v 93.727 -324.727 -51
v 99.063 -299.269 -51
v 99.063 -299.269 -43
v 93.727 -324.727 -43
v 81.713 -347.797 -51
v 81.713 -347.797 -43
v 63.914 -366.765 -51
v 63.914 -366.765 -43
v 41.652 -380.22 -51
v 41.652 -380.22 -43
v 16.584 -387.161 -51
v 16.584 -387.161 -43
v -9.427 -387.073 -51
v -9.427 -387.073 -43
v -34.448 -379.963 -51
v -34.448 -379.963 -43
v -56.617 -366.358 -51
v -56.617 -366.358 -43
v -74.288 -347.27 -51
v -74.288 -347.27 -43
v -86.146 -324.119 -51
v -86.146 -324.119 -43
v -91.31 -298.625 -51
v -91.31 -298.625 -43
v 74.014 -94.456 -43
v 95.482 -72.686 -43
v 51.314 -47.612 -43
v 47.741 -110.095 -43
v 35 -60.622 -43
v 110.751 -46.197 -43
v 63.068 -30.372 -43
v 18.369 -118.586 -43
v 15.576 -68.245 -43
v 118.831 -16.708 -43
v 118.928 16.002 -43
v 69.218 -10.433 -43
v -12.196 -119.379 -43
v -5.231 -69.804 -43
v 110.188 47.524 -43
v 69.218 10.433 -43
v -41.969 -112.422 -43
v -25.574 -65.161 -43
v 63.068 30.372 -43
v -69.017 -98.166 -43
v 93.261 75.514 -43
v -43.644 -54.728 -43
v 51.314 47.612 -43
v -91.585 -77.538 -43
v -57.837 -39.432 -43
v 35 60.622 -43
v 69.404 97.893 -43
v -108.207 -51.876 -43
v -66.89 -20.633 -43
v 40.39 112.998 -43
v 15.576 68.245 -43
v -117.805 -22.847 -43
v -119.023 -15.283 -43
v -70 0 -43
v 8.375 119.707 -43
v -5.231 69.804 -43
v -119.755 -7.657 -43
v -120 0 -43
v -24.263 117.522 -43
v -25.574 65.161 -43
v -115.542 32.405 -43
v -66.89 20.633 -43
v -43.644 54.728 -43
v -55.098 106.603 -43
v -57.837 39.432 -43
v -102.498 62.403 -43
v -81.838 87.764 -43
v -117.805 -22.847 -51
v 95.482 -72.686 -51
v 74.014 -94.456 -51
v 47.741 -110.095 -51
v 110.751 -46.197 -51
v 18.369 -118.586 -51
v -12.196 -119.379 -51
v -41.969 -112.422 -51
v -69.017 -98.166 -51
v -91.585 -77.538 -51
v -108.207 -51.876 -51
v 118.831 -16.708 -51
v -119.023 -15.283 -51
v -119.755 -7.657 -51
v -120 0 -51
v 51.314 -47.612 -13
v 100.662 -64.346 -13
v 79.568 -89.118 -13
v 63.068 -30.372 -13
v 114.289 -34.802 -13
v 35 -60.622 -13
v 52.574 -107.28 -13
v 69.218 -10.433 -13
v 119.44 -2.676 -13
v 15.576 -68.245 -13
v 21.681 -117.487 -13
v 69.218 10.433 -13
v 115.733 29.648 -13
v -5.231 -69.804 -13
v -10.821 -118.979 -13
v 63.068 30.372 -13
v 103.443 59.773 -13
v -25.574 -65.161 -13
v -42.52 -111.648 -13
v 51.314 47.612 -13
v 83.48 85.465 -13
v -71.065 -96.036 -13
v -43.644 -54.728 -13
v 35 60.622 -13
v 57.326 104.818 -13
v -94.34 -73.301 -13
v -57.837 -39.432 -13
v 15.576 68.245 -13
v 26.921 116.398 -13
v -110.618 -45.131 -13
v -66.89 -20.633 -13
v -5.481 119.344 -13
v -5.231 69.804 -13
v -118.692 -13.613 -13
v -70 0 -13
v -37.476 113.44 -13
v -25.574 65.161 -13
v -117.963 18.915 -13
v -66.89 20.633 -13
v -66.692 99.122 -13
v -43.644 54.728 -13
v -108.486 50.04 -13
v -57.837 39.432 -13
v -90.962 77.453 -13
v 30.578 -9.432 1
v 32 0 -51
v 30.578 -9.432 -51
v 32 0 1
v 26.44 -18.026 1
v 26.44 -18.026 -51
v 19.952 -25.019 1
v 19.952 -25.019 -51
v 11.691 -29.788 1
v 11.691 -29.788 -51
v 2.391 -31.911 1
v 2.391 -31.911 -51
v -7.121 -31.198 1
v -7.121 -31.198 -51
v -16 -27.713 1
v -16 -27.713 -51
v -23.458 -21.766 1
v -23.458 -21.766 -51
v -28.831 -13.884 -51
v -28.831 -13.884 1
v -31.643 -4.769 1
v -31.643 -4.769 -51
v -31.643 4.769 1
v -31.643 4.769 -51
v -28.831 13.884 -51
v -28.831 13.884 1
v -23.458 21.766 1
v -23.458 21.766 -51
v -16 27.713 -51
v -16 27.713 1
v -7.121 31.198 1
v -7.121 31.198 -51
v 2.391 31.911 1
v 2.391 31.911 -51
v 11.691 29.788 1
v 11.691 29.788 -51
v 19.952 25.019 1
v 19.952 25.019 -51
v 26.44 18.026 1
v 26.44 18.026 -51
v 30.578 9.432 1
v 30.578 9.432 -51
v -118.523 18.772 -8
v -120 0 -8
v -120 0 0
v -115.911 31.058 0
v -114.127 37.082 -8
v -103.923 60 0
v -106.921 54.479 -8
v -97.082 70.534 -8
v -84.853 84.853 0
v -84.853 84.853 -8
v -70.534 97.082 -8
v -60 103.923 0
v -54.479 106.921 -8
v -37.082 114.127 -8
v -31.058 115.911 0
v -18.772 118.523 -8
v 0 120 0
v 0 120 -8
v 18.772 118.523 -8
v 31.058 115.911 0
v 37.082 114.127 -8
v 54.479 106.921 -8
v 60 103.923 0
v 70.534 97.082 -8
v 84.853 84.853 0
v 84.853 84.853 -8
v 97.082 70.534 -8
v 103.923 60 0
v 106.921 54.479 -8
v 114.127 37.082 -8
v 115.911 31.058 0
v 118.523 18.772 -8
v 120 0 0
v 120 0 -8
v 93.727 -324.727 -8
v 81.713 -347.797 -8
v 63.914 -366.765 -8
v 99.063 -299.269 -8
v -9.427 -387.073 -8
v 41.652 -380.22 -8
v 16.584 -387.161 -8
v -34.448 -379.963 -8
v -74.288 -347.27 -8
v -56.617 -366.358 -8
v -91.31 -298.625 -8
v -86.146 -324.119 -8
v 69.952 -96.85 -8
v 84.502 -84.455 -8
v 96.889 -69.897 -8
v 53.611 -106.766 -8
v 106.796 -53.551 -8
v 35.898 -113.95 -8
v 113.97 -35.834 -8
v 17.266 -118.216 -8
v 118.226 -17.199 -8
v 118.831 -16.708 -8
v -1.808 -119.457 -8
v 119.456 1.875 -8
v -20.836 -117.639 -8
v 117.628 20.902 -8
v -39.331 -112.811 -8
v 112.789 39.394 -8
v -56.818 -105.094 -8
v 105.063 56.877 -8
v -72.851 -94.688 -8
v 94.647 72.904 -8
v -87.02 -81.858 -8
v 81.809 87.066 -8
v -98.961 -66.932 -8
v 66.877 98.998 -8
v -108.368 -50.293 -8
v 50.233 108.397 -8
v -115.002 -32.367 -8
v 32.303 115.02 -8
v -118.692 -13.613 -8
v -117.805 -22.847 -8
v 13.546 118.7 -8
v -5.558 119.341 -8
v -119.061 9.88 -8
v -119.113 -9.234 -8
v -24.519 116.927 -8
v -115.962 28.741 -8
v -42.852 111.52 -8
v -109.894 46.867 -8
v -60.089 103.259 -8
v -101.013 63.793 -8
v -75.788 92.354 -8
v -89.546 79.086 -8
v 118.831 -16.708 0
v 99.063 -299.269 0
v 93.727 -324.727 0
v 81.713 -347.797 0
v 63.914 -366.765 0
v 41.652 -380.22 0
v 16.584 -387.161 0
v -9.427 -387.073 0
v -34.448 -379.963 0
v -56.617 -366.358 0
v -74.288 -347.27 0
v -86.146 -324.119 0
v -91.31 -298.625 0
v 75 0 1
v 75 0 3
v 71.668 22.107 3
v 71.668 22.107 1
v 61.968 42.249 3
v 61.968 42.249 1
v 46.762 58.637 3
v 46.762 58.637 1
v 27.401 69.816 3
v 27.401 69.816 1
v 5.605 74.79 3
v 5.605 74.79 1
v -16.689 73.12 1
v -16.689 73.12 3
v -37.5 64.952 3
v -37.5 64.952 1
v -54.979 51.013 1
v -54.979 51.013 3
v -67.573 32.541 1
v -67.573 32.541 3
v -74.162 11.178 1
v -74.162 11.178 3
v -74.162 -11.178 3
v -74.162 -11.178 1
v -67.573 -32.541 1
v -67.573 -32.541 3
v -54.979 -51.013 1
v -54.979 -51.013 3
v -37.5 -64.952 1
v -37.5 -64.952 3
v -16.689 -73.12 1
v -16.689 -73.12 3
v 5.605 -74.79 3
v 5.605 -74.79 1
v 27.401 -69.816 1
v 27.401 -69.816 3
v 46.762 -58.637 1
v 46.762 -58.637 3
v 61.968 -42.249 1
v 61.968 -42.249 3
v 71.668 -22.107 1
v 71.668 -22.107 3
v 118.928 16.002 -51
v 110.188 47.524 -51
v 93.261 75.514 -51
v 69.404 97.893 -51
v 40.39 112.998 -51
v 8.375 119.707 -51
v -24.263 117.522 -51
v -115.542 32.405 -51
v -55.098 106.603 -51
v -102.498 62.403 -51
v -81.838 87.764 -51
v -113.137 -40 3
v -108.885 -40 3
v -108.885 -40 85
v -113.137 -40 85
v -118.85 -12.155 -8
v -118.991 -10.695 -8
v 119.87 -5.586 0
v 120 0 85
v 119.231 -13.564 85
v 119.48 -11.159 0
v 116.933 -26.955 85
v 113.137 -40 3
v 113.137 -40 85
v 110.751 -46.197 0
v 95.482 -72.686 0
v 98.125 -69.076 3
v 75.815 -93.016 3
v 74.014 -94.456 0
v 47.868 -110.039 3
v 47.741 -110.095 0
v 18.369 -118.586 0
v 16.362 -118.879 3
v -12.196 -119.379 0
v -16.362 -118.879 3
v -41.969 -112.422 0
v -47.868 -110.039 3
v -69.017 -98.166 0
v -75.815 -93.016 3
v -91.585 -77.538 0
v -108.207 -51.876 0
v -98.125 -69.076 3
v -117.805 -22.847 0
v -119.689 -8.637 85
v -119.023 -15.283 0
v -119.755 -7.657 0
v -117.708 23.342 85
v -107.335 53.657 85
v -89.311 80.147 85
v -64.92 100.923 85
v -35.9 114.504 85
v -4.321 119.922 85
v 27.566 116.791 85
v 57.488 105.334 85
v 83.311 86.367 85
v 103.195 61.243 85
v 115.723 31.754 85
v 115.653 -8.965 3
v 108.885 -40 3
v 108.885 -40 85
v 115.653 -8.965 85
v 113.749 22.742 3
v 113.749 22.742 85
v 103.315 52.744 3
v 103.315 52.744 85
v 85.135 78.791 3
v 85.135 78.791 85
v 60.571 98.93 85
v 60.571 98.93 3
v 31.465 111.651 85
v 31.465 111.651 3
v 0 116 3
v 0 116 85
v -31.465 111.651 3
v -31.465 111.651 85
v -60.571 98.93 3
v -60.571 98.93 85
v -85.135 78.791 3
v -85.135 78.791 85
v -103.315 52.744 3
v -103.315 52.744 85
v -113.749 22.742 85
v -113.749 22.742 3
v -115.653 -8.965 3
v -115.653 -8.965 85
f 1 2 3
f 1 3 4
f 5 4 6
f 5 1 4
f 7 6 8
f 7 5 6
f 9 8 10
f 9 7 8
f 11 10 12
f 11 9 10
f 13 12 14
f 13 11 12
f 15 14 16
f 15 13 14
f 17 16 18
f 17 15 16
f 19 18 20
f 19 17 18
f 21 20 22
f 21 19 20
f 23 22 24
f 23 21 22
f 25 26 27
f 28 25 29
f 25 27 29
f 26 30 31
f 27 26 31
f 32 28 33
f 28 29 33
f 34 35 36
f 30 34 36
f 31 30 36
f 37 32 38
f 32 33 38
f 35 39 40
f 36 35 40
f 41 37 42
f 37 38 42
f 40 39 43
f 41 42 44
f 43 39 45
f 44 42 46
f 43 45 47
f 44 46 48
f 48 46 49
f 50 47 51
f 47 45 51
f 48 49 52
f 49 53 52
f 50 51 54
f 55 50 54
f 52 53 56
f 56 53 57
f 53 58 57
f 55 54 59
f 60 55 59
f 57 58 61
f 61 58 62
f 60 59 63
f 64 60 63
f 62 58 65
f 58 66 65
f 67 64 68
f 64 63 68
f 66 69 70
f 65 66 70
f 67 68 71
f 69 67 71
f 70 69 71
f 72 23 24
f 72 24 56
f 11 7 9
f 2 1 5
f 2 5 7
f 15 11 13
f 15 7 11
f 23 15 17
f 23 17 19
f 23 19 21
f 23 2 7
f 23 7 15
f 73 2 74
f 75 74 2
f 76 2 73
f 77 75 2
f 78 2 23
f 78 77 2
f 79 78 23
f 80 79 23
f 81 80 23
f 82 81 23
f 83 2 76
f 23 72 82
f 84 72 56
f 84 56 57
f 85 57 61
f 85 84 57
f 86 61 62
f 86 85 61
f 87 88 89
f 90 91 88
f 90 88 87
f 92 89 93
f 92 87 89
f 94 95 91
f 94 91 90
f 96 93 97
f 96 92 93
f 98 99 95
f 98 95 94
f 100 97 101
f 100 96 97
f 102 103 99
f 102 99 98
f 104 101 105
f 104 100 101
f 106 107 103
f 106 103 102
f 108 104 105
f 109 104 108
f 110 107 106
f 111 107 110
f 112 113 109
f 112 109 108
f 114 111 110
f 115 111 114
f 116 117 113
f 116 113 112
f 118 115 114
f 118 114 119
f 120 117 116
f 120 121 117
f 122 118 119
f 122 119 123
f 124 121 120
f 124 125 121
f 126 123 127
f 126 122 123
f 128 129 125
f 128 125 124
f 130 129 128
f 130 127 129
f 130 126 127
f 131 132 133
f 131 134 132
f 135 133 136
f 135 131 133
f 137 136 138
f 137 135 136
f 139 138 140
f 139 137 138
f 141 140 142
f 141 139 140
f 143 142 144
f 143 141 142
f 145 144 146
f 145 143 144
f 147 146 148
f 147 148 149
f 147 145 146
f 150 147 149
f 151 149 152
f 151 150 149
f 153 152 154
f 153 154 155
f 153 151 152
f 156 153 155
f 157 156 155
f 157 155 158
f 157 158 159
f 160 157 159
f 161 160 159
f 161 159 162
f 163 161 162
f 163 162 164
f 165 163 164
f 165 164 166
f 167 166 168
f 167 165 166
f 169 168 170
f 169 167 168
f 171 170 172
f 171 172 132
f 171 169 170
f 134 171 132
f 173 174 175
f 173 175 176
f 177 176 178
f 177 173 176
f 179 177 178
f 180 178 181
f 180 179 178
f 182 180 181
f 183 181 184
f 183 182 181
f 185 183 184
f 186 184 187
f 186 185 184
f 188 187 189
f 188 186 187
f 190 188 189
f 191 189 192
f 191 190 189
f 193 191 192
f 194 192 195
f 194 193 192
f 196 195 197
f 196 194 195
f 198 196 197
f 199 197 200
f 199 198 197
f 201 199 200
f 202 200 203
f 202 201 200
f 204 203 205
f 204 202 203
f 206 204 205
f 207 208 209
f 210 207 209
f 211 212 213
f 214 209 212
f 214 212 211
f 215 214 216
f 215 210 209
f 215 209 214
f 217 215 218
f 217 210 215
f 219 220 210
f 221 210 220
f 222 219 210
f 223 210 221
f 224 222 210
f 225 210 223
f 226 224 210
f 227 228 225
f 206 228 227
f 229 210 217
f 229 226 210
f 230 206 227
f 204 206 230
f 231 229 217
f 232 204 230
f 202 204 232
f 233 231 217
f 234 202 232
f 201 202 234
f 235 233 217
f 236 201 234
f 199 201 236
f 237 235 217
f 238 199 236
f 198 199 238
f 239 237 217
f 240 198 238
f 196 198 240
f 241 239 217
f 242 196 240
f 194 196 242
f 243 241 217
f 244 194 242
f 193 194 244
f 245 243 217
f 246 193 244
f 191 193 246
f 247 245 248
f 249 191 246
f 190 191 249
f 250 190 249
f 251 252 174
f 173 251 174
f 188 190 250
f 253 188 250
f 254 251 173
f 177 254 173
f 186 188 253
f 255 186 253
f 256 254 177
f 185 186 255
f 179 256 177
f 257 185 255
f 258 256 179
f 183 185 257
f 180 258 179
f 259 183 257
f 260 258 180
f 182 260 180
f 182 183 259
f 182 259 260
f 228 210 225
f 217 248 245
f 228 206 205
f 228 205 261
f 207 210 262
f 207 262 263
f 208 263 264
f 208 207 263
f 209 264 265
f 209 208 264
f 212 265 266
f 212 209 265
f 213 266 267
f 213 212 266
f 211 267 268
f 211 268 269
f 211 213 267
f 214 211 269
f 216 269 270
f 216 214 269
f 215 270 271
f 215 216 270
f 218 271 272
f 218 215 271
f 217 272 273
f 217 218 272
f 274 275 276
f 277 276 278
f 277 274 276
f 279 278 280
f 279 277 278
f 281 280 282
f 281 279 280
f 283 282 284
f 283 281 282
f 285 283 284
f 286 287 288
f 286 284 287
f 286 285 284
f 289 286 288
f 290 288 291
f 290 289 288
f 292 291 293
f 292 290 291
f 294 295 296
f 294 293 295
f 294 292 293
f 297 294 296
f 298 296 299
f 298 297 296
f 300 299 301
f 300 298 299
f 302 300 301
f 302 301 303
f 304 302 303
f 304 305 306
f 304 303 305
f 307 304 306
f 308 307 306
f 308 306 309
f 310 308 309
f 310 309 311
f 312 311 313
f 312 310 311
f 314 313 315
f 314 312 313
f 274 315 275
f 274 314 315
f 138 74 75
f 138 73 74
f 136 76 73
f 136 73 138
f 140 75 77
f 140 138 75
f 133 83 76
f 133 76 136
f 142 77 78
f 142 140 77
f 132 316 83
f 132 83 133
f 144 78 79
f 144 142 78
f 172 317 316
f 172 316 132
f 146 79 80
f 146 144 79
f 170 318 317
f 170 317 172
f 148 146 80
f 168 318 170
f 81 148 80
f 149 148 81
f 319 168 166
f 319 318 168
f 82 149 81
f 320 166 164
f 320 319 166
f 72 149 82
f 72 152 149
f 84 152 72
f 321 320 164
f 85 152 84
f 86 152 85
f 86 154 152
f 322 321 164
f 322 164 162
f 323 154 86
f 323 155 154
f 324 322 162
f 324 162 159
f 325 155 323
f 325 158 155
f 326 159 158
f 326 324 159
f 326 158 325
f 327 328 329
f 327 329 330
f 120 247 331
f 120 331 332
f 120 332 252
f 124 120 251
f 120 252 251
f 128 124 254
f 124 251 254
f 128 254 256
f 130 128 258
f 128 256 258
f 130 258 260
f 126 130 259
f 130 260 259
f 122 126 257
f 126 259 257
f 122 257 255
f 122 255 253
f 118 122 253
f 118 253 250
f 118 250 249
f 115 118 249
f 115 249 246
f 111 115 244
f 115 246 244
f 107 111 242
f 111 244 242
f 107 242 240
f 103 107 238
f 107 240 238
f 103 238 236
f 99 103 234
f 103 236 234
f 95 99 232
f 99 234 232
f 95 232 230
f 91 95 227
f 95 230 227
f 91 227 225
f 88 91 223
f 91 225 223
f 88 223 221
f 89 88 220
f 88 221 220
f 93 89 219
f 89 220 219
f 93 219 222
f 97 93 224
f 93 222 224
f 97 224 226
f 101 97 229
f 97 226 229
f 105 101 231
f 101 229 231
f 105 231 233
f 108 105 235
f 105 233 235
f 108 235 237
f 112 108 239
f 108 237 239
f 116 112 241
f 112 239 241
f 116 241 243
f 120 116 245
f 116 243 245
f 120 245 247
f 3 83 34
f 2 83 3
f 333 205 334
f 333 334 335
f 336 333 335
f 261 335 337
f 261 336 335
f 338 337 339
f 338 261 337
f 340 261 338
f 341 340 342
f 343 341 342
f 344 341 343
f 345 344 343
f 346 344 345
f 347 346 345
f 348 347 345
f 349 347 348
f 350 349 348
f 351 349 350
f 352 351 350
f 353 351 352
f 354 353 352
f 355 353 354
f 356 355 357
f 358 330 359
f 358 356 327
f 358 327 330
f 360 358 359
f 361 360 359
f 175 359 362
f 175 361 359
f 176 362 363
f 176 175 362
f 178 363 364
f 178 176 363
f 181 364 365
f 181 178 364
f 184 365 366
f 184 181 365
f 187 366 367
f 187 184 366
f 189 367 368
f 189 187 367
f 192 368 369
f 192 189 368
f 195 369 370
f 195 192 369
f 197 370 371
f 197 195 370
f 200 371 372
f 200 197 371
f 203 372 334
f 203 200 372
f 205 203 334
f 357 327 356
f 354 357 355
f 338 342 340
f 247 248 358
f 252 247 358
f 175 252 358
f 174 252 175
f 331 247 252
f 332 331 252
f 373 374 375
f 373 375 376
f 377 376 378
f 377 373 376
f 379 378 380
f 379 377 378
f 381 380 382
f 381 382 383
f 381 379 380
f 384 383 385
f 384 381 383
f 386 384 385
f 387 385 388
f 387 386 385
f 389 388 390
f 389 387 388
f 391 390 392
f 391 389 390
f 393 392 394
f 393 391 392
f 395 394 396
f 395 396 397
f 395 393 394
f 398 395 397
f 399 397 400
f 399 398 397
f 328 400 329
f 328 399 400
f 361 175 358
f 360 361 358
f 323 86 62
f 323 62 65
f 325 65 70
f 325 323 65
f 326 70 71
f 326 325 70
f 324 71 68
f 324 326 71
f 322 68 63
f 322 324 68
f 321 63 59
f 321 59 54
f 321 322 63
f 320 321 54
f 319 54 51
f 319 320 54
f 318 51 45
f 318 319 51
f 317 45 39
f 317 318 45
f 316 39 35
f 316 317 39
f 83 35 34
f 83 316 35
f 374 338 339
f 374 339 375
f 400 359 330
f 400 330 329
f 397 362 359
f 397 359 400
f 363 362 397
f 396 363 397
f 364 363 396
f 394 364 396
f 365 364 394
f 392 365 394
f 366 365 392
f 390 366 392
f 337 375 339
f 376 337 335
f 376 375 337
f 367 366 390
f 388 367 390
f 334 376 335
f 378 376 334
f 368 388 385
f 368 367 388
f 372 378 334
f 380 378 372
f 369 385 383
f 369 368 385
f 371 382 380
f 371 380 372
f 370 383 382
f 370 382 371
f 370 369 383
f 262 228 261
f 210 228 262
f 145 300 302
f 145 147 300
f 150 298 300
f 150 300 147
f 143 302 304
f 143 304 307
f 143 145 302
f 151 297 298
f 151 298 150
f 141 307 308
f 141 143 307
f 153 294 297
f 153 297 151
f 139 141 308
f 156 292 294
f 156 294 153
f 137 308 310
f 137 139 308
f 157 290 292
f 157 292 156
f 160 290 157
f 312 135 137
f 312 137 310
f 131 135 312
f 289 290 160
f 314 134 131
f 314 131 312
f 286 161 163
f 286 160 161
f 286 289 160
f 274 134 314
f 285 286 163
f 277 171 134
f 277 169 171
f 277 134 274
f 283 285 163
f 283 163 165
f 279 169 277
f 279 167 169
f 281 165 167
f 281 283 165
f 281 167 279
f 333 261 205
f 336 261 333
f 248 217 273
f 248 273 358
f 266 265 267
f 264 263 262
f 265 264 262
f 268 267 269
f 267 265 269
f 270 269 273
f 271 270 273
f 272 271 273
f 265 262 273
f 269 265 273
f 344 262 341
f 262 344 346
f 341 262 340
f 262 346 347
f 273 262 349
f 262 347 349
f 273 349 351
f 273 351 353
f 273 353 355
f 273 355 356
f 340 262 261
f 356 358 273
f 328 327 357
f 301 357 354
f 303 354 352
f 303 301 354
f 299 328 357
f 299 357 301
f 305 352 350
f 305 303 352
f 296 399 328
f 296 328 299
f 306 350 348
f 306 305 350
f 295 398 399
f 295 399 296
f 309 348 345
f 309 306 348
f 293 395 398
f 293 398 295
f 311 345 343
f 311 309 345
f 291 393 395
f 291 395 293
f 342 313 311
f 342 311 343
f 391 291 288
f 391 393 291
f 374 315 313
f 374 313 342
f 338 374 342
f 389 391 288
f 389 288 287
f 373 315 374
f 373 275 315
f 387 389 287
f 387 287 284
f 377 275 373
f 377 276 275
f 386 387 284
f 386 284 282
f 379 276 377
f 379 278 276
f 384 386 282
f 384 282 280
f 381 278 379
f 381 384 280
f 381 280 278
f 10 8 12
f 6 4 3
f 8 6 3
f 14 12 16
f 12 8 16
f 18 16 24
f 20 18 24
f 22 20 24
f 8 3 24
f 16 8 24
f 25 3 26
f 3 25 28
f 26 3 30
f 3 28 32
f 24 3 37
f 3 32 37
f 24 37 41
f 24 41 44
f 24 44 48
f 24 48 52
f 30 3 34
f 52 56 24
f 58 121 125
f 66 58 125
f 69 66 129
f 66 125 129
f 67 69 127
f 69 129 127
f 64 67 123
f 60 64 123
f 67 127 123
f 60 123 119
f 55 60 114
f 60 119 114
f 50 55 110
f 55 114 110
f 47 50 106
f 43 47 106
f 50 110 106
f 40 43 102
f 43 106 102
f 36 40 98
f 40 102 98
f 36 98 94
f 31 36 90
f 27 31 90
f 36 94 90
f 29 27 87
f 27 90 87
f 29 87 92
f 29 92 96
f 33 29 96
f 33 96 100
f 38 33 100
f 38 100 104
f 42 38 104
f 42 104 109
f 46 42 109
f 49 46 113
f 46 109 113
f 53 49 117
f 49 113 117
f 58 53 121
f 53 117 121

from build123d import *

# Parameters (mm, degrees)
SKETCH2_R               = 120
BOSS_EXTRUDE2_DEPTH     = 85
CUT_EXTRUDE1_START      = -82
CUT_EXTRUDE1_DEPTH      = 82
CUT_EXTRUDE5_DEPTH      = 2
CUT_EXTRUDE5_DEPTH_BACK = 2
SKETCH8_R               = 75
SKETCH9_R               = 32
CUT_EXTRUDE6_DEPTH      = 5
SKETCH12_R              = 32
BOSS_EXTRUDE4_DEPTH     = 8
SKETCH13_R              = 119.470235088
BOSS_EXTRUDE5_DEPTH     = 5
SKETCH15_R              = 70
BOSS_EXTRUDE6_DEPTH     = 30
SKETCH16_R              = 120
BOSS_EXTRUDE7_DEPTH     = 8
CUT_EXTRUDE7_START      = -210
SKETCH19_R              = 32
CUT_EXTRUDE7_DEPTH      = 210
BOSS_EXTRUDE8_START     = -8
BOSS_EXTRUDE8_DEPTH     = 8


with BuildPart() as part:
    # Sketch2 → Boss-Extrude2 (new body)
    with BuildSketch(Plane.XY):
        Circle(SKETCH2_R)
    extrude(amount=BOSS_EXTRUDE2_DEPTH)

    # Sketch3 → Cut-Extrude1 (cut)
    with BuildSketch(Plane.XY.offset(85).offset(CUT_EXTRUDE1_START)):
        with BuildLine():
            Line((-108.885260711, -40), (-113.13708499, -40))
            ThreePointArc((-113.13708499, -40), (0, -120), (113.13708499, -40))
            Line((113.13708499, -40), (108.885260711, -40))
            ThreePointArc((108.885260711, -40), (0, 116), (-108.885260711, -40))
        make_face()
    extrude(amount=CUT_EXTRUDE1_DEPTH, mode=Mode.SUBTRACT)

    # Sketch8 → Cut-Extrude5 (cut, two sides: drawn at the far end of the back side and taken through both)
    with BuildSketch(Plane.XY.offset(3).offset(-CUT_EXTRUDE5_DEPTH_BACK)):
        Circle(SKETCH8_R)
    extrude(amount=CUT_EXTRUDE5_DEPTH + CUT_EXTRUDE5_DEPTH_BACK, mode=Mode.SUBTRACT)

    # Sketch9 → Cut-Extrude6 (cut)
    with BuildSketch(Plane.XY.offset(1)):
        Circle(SKETCH9_R)
    extrude(amount=-CUT_EXTRUDE6_DEPTH, mode=Mode.SUBTRACT)

    # Sketch12 → Boss-Extrude4 (add)
    with BuildSketch(Plane(origin=(0, 0, 0), x_dir=(-1, 0, 0), z_dir=(0, 0, -1))):
        with BuildLine():
            ThreePointArc((120, 0), (0, 120), (-120, 0))
            Line((-120, 0), (-99.063378042, -299.268538041))
            ThreePointArc((-99.063378042, -299.268538041), (-3.575656086, -388.008129656), (91.309922092, -298.624981255))
            Line((91.309922092, -298.624981255), (120, 0))
        make_face()
        Circle(SKETCH12_R, mode=Mode.SUBTRACT)
    extrude(amount=BOSS_EXTRUDE4_DEPTH)

    # Sketch13 → Boss-Extrude5 (add)
    with BuildSketch(Plane(origin=(0, 0, -8), x_dir=(-1, 0, 0), z_dir=(0, 0, -1))):
        Circle(SKETCH13_R)
    extrude(amount=BOSS_EXTRUDE5_DEPTH)

    # Sketch15 → Boss-Extrude6 (add)
    with BuildSketch(Plane(origin=(0, 0, -13), x_dir=(-1, 0, 0), z_dir=(0, 0, -1))):
        Circle(SKETCH15_R)
    extrude(amount=BOSS_EXTRUDE6_DEPTH)

    # Sketch16 → Boss-Extrude7 (add)
    with BuildSketch(Plane(origin=(0, 0, -43), x_dir=(-1, 0, 0), z_dir=(0, 0, -1))):
        Circle(SKETCH16_R)
    extrude(amount=BOSS_EXTRUDE7_DEPTH)

    # Sketch19 → Cut-Extrude7 (cut)
    with BuildSketch(Plane(origin=(0, 0, -51), x_dir=(-1, 0, 0), z_dir=(0, 0, -1)).offset(CUT_EXTRUDE7_START)):
        Circle(SKETCH19_R)
    extrude(amount=CUT_EXTRUDE7_DEPTH, mode=Mode.SUBTRACT)

    # Sketch20 → Boss-Extrude8 (add)
    with BuildSketch(Plane(origin=(0, 0, -51), x_dir=(-1, 0, 0), z_dir=(0, 0, -1)).offset(BOSS_EXTRUDE8_START)):
        with BuildLine():
            ThreePointArc((117.805011812, -22.84686394), (-3.111785776, -119.959646504), (-118.831087629, -16.70845932))
            Line((-118.831087629, -16.70845932), (-99.063378042, -299.268538041))
            ThreePointArc((-99.063378042, -299.268538041), (-3.575656086, -388.008129656), (91.309922092, -298.624981255))
            Line((91.309922092, -298.624981255), (117.805011812, -22.84686394))
        make_face()
    extrude(amount=BOSS_EXTRUDE8_DEPTH)


solid = part.part
